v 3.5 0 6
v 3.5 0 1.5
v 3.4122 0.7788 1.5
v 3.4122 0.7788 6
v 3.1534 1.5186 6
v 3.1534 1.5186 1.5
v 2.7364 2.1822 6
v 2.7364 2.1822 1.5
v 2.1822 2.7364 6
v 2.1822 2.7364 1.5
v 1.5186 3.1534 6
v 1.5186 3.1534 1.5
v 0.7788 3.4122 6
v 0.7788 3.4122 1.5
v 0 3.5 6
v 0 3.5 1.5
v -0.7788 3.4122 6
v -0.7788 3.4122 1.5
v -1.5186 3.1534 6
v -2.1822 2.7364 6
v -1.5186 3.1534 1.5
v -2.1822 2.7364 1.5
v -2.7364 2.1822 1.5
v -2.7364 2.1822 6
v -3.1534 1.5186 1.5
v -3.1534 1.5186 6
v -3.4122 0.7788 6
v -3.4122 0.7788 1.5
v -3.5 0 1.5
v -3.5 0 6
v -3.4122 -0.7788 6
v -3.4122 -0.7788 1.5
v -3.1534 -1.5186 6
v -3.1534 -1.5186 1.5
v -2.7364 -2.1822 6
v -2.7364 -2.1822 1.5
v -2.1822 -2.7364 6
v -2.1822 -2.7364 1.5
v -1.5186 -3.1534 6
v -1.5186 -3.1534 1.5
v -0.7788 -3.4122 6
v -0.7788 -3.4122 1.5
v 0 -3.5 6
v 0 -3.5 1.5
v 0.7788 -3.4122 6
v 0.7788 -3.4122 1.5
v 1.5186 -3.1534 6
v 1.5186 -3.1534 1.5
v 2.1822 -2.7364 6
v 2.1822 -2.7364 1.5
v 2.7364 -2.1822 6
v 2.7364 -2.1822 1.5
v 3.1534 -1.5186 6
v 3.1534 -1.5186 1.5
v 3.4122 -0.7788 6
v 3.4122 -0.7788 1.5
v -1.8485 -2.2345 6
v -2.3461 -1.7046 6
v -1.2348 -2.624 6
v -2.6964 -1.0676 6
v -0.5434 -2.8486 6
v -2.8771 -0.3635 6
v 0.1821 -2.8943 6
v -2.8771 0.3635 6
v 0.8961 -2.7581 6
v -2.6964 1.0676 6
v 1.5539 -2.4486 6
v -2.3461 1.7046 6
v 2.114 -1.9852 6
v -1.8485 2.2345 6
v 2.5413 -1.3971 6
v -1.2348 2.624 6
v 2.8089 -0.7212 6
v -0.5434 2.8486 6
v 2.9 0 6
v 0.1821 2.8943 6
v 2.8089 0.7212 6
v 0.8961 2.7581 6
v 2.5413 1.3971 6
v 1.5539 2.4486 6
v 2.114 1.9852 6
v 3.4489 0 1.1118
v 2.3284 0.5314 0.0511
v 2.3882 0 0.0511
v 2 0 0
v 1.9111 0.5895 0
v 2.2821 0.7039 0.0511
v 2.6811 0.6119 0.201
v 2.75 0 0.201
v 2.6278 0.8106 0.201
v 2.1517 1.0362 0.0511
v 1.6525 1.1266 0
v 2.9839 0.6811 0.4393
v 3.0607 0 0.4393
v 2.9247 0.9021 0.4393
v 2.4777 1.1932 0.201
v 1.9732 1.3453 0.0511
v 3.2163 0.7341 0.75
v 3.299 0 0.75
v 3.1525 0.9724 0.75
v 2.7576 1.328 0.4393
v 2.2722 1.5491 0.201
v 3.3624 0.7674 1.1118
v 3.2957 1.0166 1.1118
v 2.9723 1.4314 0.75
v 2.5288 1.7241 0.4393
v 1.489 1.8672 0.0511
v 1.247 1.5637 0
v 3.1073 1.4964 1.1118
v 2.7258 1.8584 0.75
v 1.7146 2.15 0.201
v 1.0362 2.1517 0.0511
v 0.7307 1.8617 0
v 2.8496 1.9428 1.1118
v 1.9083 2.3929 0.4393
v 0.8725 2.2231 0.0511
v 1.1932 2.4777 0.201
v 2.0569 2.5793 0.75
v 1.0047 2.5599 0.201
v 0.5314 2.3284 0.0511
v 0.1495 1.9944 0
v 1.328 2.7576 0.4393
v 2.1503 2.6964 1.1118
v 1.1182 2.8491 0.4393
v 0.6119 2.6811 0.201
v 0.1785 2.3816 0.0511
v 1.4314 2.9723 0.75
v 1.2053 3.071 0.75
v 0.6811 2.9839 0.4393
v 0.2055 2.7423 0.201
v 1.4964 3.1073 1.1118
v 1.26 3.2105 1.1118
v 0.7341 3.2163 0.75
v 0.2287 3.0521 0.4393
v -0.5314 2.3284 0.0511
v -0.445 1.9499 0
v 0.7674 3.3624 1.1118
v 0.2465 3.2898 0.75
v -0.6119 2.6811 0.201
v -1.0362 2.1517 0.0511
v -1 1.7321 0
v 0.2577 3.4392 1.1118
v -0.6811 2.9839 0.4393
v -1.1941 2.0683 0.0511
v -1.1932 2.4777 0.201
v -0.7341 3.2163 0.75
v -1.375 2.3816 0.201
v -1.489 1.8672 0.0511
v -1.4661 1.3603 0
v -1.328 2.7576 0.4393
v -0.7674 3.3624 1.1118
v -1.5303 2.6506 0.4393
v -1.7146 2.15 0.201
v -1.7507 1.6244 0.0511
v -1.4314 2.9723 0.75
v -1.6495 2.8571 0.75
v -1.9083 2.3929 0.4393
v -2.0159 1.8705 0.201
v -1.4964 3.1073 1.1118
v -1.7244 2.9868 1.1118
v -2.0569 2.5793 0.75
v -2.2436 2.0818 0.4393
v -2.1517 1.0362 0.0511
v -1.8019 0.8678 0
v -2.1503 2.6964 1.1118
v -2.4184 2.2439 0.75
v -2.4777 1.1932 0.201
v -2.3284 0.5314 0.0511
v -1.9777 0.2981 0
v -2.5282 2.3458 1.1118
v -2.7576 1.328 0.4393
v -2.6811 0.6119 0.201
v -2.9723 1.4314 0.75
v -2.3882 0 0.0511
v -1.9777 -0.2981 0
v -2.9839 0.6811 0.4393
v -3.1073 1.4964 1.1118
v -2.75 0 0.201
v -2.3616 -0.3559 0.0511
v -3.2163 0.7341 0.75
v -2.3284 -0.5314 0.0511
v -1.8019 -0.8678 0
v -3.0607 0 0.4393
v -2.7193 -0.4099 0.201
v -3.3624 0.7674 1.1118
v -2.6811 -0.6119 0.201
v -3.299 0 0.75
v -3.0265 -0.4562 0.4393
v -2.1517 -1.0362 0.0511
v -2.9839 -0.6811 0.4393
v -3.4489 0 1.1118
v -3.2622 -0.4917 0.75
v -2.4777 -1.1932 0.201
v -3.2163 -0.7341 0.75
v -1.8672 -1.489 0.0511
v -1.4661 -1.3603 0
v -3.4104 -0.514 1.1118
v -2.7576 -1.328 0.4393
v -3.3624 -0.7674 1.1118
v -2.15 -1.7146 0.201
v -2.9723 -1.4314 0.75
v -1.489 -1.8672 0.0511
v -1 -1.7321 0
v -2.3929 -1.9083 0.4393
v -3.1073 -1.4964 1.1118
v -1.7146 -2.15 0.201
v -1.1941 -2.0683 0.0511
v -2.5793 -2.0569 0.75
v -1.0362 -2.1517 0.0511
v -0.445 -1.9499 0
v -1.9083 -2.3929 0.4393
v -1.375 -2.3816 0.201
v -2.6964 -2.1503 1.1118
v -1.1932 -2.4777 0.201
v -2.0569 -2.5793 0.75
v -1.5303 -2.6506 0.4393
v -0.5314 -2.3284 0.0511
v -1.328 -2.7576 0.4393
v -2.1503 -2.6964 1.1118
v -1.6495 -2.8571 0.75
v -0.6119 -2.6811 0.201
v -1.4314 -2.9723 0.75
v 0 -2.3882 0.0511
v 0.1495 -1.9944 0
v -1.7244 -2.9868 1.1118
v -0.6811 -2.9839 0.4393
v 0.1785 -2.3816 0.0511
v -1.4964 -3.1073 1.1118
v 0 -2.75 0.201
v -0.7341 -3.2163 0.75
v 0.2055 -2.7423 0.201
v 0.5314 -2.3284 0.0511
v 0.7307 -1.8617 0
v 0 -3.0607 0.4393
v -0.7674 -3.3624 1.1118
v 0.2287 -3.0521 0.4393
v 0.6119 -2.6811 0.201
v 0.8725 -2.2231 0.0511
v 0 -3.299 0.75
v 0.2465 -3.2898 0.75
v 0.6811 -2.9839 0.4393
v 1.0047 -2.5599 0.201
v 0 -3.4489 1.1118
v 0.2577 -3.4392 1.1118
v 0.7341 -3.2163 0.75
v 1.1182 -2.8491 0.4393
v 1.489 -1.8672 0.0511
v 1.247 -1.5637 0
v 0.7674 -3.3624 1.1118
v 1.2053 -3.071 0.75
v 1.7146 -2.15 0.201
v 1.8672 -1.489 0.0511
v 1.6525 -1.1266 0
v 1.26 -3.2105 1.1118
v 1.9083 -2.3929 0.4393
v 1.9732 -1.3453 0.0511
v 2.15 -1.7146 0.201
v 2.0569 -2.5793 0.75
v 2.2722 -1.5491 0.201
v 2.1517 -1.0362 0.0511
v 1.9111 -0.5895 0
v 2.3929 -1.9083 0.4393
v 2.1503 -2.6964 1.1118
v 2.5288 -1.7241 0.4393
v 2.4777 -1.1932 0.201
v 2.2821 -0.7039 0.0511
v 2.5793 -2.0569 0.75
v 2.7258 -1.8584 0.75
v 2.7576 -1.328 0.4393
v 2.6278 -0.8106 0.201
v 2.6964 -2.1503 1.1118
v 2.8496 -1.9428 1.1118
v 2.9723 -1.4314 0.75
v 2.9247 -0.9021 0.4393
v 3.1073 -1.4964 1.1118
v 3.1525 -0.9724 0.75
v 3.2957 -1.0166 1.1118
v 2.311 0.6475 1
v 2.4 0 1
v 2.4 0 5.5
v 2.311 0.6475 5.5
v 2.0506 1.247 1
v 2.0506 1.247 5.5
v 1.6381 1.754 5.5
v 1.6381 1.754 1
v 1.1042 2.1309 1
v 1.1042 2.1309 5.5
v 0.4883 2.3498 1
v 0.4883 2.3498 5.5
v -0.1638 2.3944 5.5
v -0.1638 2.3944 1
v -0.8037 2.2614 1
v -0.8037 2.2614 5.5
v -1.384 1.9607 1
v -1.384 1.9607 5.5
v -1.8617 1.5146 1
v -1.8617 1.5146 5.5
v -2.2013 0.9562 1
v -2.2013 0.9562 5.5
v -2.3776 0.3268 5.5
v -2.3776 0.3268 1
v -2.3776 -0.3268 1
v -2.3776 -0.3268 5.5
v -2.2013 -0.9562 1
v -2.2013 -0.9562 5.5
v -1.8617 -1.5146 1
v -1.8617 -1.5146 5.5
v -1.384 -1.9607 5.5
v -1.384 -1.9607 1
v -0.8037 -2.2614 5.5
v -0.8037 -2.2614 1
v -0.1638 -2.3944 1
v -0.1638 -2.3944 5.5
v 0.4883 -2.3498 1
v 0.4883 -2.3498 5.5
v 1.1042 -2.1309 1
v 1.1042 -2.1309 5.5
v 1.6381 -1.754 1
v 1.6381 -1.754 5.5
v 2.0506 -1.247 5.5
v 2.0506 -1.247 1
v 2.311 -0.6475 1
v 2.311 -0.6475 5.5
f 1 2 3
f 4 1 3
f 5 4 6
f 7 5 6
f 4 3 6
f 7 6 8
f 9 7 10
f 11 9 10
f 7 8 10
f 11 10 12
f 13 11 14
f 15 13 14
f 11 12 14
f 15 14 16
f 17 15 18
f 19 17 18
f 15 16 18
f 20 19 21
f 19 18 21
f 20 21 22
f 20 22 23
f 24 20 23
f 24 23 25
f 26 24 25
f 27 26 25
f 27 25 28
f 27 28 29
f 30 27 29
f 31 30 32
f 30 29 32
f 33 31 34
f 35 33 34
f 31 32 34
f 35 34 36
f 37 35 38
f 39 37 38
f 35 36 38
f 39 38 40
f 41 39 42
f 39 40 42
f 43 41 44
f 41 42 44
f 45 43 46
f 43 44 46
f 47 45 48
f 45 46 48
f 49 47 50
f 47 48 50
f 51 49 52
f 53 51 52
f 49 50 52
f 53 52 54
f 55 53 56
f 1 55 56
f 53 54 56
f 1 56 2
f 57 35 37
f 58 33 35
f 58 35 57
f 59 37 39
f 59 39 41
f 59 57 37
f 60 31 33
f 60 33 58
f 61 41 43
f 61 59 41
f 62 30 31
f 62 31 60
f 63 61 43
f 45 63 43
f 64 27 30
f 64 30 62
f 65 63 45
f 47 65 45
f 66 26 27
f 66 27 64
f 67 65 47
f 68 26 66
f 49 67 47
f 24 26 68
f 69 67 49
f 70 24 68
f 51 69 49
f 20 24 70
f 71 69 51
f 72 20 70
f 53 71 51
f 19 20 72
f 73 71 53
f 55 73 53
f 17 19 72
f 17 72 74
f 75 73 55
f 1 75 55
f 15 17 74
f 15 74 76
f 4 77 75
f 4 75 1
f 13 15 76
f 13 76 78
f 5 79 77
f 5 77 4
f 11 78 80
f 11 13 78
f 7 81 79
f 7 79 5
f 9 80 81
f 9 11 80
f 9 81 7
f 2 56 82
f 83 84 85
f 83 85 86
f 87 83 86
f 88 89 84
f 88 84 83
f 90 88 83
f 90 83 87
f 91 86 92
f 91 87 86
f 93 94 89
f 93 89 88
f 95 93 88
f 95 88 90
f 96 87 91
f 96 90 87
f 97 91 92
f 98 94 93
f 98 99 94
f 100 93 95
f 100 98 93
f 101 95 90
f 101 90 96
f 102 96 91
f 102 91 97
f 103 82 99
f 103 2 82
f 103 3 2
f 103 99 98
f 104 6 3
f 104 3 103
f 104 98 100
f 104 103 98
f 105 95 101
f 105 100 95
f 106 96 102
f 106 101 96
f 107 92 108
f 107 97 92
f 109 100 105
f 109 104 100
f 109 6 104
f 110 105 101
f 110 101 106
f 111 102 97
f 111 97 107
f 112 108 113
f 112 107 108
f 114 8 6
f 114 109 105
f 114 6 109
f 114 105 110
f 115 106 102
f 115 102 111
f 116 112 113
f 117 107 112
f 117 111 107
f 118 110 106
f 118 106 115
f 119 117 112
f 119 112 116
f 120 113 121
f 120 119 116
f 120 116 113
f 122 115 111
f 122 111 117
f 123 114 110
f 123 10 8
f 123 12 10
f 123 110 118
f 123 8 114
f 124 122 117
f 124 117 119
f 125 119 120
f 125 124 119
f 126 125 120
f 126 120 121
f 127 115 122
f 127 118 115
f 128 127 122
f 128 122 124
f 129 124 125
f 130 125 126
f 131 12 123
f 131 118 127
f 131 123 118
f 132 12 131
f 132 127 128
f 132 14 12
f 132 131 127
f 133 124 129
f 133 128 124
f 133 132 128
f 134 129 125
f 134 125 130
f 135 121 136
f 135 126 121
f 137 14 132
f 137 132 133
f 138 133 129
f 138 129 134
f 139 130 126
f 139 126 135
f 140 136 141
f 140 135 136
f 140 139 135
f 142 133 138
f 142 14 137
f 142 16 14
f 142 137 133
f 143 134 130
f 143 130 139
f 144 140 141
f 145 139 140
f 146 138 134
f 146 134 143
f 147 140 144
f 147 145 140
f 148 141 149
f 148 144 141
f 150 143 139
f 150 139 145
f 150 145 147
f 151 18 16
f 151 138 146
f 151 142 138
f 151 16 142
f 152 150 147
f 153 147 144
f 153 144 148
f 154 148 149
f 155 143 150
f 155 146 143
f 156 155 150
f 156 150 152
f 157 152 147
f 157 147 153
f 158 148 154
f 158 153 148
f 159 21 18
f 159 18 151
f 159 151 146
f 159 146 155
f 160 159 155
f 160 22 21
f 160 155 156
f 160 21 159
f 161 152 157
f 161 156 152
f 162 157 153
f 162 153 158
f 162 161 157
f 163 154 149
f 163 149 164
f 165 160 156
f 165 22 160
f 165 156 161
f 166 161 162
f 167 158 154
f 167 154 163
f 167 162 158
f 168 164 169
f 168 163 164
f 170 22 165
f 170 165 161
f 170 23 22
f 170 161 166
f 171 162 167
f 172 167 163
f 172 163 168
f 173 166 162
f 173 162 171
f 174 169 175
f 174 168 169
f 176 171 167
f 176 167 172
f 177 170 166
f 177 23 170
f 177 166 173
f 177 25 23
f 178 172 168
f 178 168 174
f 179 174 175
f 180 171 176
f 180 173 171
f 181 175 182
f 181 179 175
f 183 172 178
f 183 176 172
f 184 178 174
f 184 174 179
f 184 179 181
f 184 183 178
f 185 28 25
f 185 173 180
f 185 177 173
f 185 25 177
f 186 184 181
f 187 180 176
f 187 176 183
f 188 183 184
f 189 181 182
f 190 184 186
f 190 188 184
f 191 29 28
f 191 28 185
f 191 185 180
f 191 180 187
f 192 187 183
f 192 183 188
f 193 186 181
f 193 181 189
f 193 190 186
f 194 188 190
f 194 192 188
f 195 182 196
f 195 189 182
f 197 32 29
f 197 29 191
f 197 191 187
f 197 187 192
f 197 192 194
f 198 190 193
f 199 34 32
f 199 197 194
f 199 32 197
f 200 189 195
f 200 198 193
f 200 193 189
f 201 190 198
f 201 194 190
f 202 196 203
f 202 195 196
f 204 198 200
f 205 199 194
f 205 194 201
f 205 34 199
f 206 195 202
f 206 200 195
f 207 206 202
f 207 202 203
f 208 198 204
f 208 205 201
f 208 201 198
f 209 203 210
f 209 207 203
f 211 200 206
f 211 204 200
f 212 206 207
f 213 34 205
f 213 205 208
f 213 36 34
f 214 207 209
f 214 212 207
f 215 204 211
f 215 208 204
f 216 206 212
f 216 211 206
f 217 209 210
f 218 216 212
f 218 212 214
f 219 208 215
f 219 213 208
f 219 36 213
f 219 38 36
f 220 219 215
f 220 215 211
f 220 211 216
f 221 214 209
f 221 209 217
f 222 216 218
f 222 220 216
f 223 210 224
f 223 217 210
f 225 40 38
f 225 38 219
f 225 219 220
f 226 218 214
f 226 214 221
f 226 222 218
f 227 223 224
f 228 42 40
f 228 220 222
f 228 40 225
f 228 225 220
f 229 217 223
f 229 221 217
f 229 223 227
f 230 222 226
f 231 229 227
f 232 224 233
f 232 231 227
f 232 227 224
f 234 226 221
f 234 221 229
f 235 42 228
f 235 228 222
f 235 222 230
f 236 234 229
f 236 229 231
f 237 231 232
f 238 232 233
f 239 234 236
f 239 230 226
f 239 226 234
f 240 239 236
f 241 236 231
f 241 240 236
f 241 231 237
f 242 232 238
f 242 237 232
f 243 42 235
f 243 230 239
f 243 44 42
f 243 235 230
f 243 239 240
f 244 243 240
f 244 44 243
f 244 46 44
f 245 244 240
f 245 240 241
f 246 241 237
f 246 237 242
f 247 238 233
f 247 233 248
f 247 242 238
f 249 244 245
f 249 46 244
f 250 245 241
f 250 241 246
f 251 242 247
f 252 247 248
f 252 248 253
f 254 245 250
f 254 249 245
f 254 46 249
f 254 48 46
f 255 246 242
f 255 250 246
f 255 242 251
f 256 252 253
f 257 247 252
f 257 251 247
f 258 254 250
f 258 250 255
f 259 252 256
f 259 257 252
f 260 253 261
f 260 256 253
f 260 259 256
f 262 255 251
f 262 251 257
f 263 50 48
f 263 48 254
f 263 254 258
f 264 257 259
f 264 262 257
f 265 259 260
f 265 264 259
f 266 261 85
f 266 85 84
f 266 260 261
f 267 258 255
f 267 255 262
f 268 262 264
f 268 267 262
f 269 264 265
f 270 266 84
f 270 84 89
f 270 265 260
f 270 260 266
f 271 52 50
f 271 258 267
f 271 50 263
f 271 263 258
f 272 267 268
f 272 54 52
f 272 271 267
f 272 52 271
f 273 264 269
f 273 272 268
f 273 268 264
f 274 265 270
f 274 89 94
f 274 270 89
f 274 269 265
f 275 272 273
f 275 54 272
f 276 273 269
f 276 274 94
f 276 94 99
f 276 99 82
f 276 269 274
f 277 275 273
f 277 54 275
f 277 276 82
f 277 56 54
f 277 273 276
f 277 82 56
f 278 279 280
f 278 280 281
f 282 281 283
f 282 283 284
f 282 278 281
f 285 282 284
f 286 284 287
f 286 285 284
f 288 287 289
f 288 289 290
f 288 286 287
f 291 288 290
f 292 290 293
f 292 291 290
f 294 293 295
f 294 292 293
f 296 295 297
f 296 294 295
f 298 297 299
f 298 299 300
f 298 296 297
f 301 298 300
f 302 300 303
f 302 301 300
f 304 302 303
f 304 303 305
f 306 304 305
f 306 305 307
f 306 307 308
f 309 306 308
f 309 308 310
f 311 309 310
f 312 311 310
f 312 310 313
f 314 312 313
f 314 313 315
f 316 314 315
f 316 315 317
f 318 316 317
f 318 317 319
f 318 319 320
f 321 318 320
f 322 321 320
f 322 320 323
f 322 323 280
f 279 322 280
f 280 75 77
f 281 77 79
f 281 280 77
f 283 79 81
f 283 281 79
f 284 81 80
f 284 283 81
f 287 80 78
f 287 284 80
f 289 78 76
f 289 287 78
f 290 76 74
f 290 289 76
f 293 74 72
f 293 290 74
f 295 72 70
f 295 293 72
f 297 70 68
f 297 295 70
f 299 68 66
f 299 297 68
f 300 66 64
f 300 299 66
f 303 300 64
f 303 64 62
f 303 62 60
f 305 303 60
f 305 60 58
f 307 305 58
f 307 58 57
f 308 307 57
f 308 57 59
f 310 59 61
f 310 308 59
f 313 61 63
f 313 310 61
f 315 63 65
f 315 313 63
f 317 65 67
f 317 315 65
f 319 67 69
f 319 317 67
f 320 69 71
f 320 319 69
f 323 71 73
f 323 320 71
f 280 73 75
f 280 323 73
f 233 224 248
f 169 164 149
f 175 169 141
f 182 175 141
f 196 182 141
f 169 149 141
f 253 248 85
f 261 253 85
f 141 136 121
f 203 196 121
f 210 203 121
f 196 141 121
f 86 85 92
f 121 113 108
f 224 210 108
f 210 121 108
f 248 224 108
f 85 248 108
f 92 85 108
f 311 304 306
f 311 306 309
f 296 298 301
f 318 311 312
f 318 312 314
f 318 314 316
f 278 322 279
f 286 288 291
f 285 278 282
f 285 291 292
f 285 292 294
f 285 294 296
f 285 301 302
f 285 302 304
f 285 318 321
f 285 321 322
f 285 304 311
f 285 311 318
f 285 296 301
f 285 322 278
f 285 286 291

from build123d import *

# Parameters (mm, degrees)
SKETCH1_R           = 3.5
SKETCH1_R_2         = 2.4
BOSS_EXTRUDE1_DEPTH = 6
SKETCH1_2_R         = 2.4
BOSS_EXTRUDE2_DEPTH = 1
FILLET1_R           = 1.5
CHAMFER1_SIZE       = 0.5


with BuildPart() as part:
    # Sketch1 → Boss-Extrude1 (new body)
    with BuildSketch(Plane.XY):
        Circle(SKETCH1_R)
        Circle(SKETCH1_R_2, mode=Mode.SUBTRACT)
    extrude(amount=BOSS_EXTRUDE1_DEPTH)

    # Sketch1<2> → Boss-Extrude2 (add)
    with BuildSketch(Plane.XY):
        Circle(SKETCH1_2_R)
    extrude(amount=BOSS_EXTRUDE2_DEPTH)

    # Fillet1
    fillet1_edges = [part.edges().sort_by_distance(p)[0] for p in [
        (-3.5, 0, 0),
    ]]
    fillet(fillet1_edges, radius=FILLET1_R)

    # Chamfer1
    chamfer1_edges = [part.edges().sort_by_distance(p)[0] for p in [
        (-2.4, 0, 6),
    ]]
    chamfer(chamfer1_edges, length=CHAMFER1_SIZE)


solid = part.part
